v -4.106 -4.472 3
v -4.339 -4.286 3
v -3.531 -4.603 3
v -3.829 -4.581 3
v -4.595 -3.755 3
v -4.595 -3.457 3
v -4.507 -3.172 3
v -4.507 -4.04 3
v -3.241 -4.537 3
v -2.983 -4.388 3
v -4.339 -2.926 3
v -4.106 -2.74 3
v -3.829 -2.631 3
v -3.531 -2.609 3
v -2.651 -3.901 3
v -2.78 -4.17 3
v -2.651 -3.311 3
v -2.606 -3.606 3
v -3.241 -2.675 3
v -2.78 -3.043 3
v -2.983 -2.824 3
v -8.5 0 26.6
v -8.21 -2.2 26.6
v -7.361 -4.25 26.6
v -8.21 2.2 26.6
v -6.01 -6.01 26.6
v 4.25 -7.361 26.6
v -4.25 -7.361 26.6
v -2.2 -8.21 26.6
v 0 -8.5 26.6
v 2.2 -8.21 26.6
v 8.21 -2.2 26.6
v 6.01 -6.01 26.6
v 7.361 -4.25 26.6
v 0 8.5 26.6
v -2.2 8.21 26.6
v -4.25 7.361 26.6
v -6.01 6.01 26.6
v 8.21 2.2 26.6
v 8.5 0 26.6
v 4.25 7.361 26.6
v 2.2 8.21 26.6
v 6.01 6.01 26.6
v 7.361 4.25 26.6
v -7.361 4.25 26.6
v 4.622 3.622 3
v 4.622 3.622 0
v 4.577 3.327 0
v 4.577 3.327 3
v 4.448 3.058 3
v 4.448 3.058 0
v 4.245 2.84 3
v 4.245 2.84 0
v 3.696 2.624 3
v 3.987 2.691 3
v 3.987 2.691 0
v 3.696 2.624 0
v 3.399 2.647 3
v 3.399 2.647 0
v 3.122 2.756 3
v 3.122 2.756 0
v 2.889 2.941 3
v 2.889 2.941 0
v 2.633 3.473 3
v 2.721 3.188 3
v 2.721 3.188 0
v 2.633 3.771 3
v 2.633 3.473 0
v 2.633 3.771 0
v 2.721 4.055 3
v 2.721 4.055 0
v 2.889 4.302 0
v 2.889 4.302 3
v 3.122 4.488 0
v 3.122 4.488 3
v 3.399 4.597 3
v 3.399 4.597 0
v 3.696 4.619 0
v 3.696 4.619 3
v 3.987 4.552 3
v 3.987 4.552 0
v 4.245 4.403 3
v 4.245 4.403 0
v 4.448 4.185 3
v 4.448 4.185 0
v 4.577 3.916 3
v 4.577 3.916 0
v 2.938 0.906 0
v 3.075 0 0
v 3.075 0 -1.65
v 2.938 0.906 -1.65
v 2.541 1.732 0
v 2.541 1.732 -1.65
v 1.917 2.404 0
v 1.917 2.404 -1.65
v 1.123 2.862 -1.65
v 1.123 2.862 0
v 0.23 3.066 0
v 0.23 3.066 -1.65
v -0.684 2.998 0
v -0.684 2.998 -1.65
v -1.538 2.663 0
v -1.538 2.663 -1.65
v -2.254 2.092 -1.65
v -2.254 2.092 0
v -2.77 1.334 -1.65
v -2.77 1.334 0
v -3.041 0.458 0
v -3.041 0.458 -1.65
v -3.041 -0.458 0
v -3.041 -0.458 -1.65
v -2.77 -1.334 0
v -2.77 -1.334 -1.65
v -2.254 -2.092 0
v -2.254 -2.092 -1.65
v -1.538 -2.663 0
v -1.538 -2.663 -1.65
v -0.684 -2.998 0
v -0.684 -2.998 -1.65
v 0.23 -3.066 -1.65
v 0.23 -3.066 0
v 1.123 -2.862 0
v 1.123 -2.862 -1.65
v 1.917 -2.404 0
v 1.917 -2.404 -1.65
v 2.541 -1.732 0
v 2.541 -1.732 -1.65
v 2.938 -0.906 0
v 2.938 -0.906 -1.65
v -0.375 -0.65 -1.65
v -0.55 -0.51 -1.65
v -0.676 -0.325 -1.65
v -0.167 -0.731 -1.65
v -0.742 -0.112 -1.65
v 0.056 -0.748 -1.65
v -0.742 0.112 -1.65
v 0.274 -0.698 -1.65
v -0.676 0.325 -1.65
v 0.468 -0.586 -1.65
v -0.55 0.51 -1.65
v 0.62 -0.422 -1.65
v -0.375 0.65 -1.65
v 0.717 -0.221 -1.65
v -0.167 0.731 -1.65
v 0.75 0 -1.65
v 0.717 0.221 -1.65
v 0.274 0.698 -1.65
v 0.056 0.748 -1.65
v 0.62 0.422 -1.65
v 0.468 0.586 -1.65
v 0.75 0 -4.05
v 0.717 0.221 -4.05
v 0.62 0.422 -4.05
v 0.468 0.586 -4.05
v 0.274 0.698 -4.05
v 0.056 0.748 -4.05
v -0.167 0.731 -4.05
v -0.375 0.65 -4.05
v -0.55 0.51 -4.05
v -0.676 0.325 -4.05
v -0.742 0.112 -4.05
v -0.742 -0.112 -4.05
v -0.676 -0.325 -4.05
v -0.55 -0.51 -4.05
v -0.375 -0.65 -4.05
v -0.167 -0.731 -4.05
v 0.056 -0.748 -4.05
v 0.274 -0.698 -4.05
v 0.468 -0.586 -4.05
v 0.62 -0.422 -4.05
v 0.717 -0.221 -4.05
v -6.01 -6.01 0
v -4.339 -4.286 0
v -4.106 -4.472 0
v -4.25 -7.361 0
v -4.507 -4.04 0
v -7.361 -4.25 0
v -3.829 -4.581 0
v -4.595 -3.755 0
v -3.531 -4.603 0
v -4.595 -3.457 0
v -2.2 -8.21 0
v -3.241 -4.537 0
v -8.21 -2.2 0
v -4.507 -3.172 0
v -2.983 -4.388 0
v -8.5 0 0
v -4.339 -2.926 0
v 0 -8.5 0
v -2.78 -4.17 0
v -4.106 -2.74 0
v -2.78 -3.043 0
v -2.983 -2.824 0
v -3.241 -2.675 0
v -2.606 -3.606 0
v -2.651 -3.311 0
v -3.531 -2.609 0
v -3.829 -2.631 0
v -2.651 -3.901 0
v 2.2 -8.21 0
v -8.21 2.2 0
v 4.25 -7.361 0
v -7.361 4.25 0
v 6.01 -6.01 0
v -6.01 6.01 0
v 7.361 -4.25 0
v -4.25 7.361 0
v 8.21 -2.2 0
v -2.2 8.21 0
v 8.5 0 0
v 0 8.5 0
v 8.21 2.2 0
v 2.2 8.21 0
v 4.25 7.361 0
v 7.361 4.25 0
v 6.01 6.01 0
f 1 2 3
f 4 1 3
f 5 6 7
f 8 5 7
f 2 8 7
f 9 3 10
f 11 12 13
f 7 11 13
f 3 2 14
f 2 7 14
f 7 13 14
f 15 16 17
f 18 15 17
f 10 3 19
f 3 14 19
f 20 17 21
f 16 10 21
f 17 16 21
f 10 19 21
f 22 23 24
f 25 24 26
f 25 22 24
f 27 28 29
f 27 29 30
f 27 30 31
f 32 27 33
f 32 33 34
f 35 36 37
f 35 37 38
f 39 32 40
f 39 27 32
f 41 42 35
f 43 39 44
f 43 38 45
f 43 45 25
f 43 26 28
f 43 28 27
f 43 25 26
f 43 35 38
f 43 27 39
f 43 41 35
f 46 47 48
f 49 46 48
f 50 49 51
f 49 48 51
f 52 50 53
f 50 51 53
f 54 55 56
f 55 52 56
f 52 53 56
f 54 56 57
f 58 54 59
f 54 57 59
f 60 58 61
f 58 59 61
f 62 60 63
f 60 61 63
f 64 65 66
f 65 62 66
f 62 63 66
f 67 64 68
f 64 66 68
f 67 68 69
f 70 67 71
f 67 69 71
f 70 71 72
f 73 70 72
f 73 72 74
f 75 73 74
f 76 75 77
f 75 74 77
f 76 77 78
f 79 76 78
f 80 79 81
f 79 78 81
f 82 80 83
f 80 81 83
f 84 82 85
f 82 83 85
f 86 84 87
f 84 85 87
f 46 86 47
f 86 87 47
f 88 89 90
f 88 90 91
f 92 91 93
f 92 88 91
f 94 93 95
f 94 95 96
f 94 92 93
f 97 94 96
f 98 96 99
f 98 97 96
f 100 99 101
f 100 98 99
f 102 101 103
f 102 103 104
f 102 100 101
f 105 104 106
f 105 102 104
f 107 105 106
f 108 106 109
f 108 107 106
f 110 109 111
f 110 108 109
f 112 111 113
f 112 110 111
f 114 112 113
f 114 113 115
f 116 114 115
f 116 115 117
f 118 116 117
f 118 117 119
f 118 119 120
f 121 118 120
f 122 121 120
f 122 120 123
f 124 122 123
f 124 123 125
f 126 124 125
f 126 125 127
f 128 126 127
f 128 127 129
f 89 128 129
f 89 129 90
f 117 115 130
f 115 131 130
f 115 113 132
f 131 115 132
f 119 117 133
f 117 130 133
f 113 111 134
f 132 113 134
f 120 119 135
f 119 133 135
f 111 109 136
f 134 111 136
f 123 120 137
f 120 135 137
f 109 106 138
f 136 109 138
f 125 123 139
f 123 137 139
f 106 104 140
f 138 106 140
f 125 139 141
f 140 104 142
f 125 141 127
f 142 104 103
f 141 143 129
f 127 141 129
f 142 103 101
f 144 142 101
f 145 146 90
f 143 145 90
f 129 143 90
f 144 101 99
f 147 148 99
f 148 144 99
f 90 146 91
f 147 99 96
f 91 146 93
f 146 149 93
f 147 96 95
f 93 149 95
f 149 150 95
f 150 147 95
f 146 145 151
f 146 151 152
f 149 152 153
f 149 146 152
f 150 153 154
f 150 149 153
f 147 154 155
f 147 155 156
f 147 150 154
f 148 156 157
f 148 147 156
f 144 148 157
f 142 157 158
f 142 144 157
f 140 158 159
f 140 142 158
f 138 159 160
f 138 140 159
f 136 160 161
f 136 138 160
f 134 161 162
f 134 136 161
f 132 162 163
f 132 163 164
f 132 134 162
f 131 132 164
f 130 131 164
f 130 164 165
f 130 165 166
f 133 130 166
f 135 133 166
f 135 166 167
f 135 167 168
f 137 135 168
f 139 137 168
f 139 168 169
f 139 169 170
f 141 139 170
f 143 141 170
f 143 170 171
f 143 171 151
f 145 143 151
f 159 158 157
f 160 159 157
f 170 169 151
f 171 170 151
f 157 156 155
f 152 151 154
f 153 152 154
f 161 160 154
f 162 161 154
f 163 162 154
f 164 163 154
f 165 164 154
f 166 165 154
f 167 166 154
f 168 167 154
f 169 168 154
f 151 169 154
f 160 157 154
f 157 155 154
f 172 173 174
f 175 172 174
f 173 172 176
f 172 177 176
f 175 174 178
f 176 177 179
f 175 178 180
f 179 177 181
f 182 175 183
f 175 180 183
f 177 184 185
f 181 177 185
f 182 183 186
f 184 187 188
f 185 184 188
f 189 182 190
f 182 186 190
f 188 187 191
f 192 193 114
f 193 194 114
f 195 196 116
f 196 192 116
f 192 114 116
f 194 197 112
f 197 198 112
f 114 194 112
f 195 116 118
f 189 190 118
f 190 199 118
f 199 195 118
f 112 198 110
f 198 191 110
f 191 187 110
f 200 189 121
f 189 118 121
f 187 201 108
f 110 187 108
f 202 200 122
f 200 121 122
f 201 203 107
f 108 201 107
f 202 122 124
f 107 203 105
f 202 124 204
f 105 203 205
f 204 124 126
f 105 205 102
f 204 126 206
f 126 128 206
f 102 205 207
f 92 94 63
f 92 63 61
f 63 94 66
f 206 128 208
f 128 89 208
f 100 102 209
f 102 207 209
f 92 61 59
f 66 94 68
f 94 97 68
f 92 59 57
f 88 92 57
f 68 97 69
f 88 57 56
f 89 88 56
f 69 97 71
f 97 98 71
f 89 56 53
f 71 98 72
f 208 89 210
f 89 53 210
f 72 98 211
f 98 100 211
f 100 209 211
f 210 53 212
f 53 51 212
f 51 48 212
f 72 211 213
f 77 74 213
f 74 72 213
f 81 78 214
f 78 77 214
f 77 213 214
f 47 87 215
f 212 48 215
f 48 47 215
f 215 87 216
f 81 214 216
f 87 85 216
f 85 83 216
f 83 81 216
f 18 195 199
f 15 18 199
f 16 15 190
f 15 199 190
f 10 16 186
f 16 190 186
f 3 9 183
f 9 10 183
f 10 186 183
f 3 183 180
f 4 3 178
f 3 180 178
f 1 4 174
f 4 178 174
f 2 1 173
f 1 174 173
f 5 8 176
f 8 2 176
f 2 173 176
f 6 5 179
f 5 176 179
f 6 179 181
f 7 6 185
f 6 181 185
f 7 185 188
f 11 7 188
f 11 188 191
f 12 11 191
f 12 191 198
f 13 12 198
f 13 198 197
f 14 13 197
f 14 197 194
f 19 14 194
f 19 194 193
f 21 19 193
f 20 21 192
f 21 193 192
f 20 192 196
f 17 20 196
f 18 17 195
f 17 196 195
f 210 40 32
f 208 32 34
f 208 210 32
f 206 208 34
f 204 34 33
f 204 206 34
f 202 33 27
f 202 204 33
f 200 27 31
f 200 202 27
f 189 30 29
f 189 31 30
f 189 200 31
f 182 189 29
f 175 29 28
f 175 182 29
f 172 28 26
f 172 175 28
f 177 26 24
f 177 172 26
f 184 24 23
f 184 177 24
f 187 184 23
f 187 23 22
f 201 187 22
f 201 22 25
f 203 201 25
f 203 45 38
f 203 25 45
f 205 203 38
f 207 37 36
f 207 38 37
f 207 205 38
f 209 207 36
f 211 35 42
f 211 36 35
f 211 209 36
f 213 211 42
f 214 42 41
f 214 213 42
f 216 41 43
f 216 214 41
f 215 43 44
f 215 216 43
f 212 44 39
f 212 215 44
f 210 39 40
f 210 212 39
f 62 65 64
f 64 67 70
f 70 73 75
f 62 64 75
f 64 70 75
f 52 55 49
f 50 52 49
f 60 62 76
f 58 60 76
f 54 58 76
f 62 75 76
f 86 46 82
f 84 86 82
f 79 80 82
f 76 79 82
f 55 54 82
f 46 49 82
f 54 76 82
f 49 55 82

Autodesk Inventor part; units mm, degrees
ref_plane "YZ Plane" through (0, 0, 0) normal (1, 0, 0) x (0, 1, 0)
ref_plane "XZ Plane" through (0, 0, 0) normal (0, 1, 0) x (-1, 0, 0)
ref_plane "XY Plane" through (0, 0, 0) normal (0, 0, 1) x (1, 0, 0)
sketch "Sketch1" plane through (0, 0, 0) normal (0, 0, 1) x (1, 0, 0)
  circle A0 centre (0, 0) radius 8.5
  circle A1 centre (0, 0) radius 3.075
  circle A2 centre (0, 0) radius 0.75
  line L0 (0, 0) -> (-3.6062, -3.6062) construction
  line L1 (0, 0) -> (5.1, 0) construction
  line L2 (0, 0) -> (3.6062, 3.6062) construction
  line L3 (0, 0) -> (5.1, 0) construction
  circle A3 centre (-3.6062, -3.6062) radius 1
  circle A4 centre (3.6216, 3.6216) radius 1
  dimension "d0" = 17
  dimension "d1" = 6.15
  dimension "d2" = 1.5
  dimension "d3" = 5.1
  dimension "d4" = 135
  dimension "d5" = 5.1
  dimension "d6" = 45
  dimension "d7" = 2
  dimension "d8" = 2
extrude "Extrusion1" add sketch "Sketch1" along normal blind 3 contours A0 | A1 | A2
ref_plane "Work Plane1" through (-7.1967, -146.8933, 23.5) normal (1, 0, 0) x (0, 1, 0)
sketch "Sketch2" plane through (-7.1967, -146.8933, 23.5) normal (1, 0, 0) x (0, 1, 0)
  line L0 (146.8933, -23.5) -> (146.8933, 3.1)
  line L1 (146.8933, -23.5) -> (173.4933, -23.5) construction
  line L2 (146.8933, 3.1) -> (141.8933, 3.1)
  line L3 (146.8933, 3.1) -> (151.8933, 3.1) construction
  dimension "d11" = 26.6
  dimension "d12" = 90
  dimension "d13" = 5
  dimension "d14" = 180
ref_plane "Work Plane4" through (0, 0, 26.6) normal (0, 0, -1) x (-1, 0, 0)
extrude "Extrusion2" add sketch "Sketch1" along normal up to surface (23.6 mm away) from surface at 3 contours A0 | A1 | A2 | A3 | A4
extrude "Extrusion3" add sketch "Sketch1" against normal blind 1.65 contours A1 | A2
extrude "Extrusion4" add sketch "Sketch1" against normal blind 4.05 contours A2
equation "\"d5\" = d3"
equation "\"d8\" = d7"
properties part number "MOTOR"
